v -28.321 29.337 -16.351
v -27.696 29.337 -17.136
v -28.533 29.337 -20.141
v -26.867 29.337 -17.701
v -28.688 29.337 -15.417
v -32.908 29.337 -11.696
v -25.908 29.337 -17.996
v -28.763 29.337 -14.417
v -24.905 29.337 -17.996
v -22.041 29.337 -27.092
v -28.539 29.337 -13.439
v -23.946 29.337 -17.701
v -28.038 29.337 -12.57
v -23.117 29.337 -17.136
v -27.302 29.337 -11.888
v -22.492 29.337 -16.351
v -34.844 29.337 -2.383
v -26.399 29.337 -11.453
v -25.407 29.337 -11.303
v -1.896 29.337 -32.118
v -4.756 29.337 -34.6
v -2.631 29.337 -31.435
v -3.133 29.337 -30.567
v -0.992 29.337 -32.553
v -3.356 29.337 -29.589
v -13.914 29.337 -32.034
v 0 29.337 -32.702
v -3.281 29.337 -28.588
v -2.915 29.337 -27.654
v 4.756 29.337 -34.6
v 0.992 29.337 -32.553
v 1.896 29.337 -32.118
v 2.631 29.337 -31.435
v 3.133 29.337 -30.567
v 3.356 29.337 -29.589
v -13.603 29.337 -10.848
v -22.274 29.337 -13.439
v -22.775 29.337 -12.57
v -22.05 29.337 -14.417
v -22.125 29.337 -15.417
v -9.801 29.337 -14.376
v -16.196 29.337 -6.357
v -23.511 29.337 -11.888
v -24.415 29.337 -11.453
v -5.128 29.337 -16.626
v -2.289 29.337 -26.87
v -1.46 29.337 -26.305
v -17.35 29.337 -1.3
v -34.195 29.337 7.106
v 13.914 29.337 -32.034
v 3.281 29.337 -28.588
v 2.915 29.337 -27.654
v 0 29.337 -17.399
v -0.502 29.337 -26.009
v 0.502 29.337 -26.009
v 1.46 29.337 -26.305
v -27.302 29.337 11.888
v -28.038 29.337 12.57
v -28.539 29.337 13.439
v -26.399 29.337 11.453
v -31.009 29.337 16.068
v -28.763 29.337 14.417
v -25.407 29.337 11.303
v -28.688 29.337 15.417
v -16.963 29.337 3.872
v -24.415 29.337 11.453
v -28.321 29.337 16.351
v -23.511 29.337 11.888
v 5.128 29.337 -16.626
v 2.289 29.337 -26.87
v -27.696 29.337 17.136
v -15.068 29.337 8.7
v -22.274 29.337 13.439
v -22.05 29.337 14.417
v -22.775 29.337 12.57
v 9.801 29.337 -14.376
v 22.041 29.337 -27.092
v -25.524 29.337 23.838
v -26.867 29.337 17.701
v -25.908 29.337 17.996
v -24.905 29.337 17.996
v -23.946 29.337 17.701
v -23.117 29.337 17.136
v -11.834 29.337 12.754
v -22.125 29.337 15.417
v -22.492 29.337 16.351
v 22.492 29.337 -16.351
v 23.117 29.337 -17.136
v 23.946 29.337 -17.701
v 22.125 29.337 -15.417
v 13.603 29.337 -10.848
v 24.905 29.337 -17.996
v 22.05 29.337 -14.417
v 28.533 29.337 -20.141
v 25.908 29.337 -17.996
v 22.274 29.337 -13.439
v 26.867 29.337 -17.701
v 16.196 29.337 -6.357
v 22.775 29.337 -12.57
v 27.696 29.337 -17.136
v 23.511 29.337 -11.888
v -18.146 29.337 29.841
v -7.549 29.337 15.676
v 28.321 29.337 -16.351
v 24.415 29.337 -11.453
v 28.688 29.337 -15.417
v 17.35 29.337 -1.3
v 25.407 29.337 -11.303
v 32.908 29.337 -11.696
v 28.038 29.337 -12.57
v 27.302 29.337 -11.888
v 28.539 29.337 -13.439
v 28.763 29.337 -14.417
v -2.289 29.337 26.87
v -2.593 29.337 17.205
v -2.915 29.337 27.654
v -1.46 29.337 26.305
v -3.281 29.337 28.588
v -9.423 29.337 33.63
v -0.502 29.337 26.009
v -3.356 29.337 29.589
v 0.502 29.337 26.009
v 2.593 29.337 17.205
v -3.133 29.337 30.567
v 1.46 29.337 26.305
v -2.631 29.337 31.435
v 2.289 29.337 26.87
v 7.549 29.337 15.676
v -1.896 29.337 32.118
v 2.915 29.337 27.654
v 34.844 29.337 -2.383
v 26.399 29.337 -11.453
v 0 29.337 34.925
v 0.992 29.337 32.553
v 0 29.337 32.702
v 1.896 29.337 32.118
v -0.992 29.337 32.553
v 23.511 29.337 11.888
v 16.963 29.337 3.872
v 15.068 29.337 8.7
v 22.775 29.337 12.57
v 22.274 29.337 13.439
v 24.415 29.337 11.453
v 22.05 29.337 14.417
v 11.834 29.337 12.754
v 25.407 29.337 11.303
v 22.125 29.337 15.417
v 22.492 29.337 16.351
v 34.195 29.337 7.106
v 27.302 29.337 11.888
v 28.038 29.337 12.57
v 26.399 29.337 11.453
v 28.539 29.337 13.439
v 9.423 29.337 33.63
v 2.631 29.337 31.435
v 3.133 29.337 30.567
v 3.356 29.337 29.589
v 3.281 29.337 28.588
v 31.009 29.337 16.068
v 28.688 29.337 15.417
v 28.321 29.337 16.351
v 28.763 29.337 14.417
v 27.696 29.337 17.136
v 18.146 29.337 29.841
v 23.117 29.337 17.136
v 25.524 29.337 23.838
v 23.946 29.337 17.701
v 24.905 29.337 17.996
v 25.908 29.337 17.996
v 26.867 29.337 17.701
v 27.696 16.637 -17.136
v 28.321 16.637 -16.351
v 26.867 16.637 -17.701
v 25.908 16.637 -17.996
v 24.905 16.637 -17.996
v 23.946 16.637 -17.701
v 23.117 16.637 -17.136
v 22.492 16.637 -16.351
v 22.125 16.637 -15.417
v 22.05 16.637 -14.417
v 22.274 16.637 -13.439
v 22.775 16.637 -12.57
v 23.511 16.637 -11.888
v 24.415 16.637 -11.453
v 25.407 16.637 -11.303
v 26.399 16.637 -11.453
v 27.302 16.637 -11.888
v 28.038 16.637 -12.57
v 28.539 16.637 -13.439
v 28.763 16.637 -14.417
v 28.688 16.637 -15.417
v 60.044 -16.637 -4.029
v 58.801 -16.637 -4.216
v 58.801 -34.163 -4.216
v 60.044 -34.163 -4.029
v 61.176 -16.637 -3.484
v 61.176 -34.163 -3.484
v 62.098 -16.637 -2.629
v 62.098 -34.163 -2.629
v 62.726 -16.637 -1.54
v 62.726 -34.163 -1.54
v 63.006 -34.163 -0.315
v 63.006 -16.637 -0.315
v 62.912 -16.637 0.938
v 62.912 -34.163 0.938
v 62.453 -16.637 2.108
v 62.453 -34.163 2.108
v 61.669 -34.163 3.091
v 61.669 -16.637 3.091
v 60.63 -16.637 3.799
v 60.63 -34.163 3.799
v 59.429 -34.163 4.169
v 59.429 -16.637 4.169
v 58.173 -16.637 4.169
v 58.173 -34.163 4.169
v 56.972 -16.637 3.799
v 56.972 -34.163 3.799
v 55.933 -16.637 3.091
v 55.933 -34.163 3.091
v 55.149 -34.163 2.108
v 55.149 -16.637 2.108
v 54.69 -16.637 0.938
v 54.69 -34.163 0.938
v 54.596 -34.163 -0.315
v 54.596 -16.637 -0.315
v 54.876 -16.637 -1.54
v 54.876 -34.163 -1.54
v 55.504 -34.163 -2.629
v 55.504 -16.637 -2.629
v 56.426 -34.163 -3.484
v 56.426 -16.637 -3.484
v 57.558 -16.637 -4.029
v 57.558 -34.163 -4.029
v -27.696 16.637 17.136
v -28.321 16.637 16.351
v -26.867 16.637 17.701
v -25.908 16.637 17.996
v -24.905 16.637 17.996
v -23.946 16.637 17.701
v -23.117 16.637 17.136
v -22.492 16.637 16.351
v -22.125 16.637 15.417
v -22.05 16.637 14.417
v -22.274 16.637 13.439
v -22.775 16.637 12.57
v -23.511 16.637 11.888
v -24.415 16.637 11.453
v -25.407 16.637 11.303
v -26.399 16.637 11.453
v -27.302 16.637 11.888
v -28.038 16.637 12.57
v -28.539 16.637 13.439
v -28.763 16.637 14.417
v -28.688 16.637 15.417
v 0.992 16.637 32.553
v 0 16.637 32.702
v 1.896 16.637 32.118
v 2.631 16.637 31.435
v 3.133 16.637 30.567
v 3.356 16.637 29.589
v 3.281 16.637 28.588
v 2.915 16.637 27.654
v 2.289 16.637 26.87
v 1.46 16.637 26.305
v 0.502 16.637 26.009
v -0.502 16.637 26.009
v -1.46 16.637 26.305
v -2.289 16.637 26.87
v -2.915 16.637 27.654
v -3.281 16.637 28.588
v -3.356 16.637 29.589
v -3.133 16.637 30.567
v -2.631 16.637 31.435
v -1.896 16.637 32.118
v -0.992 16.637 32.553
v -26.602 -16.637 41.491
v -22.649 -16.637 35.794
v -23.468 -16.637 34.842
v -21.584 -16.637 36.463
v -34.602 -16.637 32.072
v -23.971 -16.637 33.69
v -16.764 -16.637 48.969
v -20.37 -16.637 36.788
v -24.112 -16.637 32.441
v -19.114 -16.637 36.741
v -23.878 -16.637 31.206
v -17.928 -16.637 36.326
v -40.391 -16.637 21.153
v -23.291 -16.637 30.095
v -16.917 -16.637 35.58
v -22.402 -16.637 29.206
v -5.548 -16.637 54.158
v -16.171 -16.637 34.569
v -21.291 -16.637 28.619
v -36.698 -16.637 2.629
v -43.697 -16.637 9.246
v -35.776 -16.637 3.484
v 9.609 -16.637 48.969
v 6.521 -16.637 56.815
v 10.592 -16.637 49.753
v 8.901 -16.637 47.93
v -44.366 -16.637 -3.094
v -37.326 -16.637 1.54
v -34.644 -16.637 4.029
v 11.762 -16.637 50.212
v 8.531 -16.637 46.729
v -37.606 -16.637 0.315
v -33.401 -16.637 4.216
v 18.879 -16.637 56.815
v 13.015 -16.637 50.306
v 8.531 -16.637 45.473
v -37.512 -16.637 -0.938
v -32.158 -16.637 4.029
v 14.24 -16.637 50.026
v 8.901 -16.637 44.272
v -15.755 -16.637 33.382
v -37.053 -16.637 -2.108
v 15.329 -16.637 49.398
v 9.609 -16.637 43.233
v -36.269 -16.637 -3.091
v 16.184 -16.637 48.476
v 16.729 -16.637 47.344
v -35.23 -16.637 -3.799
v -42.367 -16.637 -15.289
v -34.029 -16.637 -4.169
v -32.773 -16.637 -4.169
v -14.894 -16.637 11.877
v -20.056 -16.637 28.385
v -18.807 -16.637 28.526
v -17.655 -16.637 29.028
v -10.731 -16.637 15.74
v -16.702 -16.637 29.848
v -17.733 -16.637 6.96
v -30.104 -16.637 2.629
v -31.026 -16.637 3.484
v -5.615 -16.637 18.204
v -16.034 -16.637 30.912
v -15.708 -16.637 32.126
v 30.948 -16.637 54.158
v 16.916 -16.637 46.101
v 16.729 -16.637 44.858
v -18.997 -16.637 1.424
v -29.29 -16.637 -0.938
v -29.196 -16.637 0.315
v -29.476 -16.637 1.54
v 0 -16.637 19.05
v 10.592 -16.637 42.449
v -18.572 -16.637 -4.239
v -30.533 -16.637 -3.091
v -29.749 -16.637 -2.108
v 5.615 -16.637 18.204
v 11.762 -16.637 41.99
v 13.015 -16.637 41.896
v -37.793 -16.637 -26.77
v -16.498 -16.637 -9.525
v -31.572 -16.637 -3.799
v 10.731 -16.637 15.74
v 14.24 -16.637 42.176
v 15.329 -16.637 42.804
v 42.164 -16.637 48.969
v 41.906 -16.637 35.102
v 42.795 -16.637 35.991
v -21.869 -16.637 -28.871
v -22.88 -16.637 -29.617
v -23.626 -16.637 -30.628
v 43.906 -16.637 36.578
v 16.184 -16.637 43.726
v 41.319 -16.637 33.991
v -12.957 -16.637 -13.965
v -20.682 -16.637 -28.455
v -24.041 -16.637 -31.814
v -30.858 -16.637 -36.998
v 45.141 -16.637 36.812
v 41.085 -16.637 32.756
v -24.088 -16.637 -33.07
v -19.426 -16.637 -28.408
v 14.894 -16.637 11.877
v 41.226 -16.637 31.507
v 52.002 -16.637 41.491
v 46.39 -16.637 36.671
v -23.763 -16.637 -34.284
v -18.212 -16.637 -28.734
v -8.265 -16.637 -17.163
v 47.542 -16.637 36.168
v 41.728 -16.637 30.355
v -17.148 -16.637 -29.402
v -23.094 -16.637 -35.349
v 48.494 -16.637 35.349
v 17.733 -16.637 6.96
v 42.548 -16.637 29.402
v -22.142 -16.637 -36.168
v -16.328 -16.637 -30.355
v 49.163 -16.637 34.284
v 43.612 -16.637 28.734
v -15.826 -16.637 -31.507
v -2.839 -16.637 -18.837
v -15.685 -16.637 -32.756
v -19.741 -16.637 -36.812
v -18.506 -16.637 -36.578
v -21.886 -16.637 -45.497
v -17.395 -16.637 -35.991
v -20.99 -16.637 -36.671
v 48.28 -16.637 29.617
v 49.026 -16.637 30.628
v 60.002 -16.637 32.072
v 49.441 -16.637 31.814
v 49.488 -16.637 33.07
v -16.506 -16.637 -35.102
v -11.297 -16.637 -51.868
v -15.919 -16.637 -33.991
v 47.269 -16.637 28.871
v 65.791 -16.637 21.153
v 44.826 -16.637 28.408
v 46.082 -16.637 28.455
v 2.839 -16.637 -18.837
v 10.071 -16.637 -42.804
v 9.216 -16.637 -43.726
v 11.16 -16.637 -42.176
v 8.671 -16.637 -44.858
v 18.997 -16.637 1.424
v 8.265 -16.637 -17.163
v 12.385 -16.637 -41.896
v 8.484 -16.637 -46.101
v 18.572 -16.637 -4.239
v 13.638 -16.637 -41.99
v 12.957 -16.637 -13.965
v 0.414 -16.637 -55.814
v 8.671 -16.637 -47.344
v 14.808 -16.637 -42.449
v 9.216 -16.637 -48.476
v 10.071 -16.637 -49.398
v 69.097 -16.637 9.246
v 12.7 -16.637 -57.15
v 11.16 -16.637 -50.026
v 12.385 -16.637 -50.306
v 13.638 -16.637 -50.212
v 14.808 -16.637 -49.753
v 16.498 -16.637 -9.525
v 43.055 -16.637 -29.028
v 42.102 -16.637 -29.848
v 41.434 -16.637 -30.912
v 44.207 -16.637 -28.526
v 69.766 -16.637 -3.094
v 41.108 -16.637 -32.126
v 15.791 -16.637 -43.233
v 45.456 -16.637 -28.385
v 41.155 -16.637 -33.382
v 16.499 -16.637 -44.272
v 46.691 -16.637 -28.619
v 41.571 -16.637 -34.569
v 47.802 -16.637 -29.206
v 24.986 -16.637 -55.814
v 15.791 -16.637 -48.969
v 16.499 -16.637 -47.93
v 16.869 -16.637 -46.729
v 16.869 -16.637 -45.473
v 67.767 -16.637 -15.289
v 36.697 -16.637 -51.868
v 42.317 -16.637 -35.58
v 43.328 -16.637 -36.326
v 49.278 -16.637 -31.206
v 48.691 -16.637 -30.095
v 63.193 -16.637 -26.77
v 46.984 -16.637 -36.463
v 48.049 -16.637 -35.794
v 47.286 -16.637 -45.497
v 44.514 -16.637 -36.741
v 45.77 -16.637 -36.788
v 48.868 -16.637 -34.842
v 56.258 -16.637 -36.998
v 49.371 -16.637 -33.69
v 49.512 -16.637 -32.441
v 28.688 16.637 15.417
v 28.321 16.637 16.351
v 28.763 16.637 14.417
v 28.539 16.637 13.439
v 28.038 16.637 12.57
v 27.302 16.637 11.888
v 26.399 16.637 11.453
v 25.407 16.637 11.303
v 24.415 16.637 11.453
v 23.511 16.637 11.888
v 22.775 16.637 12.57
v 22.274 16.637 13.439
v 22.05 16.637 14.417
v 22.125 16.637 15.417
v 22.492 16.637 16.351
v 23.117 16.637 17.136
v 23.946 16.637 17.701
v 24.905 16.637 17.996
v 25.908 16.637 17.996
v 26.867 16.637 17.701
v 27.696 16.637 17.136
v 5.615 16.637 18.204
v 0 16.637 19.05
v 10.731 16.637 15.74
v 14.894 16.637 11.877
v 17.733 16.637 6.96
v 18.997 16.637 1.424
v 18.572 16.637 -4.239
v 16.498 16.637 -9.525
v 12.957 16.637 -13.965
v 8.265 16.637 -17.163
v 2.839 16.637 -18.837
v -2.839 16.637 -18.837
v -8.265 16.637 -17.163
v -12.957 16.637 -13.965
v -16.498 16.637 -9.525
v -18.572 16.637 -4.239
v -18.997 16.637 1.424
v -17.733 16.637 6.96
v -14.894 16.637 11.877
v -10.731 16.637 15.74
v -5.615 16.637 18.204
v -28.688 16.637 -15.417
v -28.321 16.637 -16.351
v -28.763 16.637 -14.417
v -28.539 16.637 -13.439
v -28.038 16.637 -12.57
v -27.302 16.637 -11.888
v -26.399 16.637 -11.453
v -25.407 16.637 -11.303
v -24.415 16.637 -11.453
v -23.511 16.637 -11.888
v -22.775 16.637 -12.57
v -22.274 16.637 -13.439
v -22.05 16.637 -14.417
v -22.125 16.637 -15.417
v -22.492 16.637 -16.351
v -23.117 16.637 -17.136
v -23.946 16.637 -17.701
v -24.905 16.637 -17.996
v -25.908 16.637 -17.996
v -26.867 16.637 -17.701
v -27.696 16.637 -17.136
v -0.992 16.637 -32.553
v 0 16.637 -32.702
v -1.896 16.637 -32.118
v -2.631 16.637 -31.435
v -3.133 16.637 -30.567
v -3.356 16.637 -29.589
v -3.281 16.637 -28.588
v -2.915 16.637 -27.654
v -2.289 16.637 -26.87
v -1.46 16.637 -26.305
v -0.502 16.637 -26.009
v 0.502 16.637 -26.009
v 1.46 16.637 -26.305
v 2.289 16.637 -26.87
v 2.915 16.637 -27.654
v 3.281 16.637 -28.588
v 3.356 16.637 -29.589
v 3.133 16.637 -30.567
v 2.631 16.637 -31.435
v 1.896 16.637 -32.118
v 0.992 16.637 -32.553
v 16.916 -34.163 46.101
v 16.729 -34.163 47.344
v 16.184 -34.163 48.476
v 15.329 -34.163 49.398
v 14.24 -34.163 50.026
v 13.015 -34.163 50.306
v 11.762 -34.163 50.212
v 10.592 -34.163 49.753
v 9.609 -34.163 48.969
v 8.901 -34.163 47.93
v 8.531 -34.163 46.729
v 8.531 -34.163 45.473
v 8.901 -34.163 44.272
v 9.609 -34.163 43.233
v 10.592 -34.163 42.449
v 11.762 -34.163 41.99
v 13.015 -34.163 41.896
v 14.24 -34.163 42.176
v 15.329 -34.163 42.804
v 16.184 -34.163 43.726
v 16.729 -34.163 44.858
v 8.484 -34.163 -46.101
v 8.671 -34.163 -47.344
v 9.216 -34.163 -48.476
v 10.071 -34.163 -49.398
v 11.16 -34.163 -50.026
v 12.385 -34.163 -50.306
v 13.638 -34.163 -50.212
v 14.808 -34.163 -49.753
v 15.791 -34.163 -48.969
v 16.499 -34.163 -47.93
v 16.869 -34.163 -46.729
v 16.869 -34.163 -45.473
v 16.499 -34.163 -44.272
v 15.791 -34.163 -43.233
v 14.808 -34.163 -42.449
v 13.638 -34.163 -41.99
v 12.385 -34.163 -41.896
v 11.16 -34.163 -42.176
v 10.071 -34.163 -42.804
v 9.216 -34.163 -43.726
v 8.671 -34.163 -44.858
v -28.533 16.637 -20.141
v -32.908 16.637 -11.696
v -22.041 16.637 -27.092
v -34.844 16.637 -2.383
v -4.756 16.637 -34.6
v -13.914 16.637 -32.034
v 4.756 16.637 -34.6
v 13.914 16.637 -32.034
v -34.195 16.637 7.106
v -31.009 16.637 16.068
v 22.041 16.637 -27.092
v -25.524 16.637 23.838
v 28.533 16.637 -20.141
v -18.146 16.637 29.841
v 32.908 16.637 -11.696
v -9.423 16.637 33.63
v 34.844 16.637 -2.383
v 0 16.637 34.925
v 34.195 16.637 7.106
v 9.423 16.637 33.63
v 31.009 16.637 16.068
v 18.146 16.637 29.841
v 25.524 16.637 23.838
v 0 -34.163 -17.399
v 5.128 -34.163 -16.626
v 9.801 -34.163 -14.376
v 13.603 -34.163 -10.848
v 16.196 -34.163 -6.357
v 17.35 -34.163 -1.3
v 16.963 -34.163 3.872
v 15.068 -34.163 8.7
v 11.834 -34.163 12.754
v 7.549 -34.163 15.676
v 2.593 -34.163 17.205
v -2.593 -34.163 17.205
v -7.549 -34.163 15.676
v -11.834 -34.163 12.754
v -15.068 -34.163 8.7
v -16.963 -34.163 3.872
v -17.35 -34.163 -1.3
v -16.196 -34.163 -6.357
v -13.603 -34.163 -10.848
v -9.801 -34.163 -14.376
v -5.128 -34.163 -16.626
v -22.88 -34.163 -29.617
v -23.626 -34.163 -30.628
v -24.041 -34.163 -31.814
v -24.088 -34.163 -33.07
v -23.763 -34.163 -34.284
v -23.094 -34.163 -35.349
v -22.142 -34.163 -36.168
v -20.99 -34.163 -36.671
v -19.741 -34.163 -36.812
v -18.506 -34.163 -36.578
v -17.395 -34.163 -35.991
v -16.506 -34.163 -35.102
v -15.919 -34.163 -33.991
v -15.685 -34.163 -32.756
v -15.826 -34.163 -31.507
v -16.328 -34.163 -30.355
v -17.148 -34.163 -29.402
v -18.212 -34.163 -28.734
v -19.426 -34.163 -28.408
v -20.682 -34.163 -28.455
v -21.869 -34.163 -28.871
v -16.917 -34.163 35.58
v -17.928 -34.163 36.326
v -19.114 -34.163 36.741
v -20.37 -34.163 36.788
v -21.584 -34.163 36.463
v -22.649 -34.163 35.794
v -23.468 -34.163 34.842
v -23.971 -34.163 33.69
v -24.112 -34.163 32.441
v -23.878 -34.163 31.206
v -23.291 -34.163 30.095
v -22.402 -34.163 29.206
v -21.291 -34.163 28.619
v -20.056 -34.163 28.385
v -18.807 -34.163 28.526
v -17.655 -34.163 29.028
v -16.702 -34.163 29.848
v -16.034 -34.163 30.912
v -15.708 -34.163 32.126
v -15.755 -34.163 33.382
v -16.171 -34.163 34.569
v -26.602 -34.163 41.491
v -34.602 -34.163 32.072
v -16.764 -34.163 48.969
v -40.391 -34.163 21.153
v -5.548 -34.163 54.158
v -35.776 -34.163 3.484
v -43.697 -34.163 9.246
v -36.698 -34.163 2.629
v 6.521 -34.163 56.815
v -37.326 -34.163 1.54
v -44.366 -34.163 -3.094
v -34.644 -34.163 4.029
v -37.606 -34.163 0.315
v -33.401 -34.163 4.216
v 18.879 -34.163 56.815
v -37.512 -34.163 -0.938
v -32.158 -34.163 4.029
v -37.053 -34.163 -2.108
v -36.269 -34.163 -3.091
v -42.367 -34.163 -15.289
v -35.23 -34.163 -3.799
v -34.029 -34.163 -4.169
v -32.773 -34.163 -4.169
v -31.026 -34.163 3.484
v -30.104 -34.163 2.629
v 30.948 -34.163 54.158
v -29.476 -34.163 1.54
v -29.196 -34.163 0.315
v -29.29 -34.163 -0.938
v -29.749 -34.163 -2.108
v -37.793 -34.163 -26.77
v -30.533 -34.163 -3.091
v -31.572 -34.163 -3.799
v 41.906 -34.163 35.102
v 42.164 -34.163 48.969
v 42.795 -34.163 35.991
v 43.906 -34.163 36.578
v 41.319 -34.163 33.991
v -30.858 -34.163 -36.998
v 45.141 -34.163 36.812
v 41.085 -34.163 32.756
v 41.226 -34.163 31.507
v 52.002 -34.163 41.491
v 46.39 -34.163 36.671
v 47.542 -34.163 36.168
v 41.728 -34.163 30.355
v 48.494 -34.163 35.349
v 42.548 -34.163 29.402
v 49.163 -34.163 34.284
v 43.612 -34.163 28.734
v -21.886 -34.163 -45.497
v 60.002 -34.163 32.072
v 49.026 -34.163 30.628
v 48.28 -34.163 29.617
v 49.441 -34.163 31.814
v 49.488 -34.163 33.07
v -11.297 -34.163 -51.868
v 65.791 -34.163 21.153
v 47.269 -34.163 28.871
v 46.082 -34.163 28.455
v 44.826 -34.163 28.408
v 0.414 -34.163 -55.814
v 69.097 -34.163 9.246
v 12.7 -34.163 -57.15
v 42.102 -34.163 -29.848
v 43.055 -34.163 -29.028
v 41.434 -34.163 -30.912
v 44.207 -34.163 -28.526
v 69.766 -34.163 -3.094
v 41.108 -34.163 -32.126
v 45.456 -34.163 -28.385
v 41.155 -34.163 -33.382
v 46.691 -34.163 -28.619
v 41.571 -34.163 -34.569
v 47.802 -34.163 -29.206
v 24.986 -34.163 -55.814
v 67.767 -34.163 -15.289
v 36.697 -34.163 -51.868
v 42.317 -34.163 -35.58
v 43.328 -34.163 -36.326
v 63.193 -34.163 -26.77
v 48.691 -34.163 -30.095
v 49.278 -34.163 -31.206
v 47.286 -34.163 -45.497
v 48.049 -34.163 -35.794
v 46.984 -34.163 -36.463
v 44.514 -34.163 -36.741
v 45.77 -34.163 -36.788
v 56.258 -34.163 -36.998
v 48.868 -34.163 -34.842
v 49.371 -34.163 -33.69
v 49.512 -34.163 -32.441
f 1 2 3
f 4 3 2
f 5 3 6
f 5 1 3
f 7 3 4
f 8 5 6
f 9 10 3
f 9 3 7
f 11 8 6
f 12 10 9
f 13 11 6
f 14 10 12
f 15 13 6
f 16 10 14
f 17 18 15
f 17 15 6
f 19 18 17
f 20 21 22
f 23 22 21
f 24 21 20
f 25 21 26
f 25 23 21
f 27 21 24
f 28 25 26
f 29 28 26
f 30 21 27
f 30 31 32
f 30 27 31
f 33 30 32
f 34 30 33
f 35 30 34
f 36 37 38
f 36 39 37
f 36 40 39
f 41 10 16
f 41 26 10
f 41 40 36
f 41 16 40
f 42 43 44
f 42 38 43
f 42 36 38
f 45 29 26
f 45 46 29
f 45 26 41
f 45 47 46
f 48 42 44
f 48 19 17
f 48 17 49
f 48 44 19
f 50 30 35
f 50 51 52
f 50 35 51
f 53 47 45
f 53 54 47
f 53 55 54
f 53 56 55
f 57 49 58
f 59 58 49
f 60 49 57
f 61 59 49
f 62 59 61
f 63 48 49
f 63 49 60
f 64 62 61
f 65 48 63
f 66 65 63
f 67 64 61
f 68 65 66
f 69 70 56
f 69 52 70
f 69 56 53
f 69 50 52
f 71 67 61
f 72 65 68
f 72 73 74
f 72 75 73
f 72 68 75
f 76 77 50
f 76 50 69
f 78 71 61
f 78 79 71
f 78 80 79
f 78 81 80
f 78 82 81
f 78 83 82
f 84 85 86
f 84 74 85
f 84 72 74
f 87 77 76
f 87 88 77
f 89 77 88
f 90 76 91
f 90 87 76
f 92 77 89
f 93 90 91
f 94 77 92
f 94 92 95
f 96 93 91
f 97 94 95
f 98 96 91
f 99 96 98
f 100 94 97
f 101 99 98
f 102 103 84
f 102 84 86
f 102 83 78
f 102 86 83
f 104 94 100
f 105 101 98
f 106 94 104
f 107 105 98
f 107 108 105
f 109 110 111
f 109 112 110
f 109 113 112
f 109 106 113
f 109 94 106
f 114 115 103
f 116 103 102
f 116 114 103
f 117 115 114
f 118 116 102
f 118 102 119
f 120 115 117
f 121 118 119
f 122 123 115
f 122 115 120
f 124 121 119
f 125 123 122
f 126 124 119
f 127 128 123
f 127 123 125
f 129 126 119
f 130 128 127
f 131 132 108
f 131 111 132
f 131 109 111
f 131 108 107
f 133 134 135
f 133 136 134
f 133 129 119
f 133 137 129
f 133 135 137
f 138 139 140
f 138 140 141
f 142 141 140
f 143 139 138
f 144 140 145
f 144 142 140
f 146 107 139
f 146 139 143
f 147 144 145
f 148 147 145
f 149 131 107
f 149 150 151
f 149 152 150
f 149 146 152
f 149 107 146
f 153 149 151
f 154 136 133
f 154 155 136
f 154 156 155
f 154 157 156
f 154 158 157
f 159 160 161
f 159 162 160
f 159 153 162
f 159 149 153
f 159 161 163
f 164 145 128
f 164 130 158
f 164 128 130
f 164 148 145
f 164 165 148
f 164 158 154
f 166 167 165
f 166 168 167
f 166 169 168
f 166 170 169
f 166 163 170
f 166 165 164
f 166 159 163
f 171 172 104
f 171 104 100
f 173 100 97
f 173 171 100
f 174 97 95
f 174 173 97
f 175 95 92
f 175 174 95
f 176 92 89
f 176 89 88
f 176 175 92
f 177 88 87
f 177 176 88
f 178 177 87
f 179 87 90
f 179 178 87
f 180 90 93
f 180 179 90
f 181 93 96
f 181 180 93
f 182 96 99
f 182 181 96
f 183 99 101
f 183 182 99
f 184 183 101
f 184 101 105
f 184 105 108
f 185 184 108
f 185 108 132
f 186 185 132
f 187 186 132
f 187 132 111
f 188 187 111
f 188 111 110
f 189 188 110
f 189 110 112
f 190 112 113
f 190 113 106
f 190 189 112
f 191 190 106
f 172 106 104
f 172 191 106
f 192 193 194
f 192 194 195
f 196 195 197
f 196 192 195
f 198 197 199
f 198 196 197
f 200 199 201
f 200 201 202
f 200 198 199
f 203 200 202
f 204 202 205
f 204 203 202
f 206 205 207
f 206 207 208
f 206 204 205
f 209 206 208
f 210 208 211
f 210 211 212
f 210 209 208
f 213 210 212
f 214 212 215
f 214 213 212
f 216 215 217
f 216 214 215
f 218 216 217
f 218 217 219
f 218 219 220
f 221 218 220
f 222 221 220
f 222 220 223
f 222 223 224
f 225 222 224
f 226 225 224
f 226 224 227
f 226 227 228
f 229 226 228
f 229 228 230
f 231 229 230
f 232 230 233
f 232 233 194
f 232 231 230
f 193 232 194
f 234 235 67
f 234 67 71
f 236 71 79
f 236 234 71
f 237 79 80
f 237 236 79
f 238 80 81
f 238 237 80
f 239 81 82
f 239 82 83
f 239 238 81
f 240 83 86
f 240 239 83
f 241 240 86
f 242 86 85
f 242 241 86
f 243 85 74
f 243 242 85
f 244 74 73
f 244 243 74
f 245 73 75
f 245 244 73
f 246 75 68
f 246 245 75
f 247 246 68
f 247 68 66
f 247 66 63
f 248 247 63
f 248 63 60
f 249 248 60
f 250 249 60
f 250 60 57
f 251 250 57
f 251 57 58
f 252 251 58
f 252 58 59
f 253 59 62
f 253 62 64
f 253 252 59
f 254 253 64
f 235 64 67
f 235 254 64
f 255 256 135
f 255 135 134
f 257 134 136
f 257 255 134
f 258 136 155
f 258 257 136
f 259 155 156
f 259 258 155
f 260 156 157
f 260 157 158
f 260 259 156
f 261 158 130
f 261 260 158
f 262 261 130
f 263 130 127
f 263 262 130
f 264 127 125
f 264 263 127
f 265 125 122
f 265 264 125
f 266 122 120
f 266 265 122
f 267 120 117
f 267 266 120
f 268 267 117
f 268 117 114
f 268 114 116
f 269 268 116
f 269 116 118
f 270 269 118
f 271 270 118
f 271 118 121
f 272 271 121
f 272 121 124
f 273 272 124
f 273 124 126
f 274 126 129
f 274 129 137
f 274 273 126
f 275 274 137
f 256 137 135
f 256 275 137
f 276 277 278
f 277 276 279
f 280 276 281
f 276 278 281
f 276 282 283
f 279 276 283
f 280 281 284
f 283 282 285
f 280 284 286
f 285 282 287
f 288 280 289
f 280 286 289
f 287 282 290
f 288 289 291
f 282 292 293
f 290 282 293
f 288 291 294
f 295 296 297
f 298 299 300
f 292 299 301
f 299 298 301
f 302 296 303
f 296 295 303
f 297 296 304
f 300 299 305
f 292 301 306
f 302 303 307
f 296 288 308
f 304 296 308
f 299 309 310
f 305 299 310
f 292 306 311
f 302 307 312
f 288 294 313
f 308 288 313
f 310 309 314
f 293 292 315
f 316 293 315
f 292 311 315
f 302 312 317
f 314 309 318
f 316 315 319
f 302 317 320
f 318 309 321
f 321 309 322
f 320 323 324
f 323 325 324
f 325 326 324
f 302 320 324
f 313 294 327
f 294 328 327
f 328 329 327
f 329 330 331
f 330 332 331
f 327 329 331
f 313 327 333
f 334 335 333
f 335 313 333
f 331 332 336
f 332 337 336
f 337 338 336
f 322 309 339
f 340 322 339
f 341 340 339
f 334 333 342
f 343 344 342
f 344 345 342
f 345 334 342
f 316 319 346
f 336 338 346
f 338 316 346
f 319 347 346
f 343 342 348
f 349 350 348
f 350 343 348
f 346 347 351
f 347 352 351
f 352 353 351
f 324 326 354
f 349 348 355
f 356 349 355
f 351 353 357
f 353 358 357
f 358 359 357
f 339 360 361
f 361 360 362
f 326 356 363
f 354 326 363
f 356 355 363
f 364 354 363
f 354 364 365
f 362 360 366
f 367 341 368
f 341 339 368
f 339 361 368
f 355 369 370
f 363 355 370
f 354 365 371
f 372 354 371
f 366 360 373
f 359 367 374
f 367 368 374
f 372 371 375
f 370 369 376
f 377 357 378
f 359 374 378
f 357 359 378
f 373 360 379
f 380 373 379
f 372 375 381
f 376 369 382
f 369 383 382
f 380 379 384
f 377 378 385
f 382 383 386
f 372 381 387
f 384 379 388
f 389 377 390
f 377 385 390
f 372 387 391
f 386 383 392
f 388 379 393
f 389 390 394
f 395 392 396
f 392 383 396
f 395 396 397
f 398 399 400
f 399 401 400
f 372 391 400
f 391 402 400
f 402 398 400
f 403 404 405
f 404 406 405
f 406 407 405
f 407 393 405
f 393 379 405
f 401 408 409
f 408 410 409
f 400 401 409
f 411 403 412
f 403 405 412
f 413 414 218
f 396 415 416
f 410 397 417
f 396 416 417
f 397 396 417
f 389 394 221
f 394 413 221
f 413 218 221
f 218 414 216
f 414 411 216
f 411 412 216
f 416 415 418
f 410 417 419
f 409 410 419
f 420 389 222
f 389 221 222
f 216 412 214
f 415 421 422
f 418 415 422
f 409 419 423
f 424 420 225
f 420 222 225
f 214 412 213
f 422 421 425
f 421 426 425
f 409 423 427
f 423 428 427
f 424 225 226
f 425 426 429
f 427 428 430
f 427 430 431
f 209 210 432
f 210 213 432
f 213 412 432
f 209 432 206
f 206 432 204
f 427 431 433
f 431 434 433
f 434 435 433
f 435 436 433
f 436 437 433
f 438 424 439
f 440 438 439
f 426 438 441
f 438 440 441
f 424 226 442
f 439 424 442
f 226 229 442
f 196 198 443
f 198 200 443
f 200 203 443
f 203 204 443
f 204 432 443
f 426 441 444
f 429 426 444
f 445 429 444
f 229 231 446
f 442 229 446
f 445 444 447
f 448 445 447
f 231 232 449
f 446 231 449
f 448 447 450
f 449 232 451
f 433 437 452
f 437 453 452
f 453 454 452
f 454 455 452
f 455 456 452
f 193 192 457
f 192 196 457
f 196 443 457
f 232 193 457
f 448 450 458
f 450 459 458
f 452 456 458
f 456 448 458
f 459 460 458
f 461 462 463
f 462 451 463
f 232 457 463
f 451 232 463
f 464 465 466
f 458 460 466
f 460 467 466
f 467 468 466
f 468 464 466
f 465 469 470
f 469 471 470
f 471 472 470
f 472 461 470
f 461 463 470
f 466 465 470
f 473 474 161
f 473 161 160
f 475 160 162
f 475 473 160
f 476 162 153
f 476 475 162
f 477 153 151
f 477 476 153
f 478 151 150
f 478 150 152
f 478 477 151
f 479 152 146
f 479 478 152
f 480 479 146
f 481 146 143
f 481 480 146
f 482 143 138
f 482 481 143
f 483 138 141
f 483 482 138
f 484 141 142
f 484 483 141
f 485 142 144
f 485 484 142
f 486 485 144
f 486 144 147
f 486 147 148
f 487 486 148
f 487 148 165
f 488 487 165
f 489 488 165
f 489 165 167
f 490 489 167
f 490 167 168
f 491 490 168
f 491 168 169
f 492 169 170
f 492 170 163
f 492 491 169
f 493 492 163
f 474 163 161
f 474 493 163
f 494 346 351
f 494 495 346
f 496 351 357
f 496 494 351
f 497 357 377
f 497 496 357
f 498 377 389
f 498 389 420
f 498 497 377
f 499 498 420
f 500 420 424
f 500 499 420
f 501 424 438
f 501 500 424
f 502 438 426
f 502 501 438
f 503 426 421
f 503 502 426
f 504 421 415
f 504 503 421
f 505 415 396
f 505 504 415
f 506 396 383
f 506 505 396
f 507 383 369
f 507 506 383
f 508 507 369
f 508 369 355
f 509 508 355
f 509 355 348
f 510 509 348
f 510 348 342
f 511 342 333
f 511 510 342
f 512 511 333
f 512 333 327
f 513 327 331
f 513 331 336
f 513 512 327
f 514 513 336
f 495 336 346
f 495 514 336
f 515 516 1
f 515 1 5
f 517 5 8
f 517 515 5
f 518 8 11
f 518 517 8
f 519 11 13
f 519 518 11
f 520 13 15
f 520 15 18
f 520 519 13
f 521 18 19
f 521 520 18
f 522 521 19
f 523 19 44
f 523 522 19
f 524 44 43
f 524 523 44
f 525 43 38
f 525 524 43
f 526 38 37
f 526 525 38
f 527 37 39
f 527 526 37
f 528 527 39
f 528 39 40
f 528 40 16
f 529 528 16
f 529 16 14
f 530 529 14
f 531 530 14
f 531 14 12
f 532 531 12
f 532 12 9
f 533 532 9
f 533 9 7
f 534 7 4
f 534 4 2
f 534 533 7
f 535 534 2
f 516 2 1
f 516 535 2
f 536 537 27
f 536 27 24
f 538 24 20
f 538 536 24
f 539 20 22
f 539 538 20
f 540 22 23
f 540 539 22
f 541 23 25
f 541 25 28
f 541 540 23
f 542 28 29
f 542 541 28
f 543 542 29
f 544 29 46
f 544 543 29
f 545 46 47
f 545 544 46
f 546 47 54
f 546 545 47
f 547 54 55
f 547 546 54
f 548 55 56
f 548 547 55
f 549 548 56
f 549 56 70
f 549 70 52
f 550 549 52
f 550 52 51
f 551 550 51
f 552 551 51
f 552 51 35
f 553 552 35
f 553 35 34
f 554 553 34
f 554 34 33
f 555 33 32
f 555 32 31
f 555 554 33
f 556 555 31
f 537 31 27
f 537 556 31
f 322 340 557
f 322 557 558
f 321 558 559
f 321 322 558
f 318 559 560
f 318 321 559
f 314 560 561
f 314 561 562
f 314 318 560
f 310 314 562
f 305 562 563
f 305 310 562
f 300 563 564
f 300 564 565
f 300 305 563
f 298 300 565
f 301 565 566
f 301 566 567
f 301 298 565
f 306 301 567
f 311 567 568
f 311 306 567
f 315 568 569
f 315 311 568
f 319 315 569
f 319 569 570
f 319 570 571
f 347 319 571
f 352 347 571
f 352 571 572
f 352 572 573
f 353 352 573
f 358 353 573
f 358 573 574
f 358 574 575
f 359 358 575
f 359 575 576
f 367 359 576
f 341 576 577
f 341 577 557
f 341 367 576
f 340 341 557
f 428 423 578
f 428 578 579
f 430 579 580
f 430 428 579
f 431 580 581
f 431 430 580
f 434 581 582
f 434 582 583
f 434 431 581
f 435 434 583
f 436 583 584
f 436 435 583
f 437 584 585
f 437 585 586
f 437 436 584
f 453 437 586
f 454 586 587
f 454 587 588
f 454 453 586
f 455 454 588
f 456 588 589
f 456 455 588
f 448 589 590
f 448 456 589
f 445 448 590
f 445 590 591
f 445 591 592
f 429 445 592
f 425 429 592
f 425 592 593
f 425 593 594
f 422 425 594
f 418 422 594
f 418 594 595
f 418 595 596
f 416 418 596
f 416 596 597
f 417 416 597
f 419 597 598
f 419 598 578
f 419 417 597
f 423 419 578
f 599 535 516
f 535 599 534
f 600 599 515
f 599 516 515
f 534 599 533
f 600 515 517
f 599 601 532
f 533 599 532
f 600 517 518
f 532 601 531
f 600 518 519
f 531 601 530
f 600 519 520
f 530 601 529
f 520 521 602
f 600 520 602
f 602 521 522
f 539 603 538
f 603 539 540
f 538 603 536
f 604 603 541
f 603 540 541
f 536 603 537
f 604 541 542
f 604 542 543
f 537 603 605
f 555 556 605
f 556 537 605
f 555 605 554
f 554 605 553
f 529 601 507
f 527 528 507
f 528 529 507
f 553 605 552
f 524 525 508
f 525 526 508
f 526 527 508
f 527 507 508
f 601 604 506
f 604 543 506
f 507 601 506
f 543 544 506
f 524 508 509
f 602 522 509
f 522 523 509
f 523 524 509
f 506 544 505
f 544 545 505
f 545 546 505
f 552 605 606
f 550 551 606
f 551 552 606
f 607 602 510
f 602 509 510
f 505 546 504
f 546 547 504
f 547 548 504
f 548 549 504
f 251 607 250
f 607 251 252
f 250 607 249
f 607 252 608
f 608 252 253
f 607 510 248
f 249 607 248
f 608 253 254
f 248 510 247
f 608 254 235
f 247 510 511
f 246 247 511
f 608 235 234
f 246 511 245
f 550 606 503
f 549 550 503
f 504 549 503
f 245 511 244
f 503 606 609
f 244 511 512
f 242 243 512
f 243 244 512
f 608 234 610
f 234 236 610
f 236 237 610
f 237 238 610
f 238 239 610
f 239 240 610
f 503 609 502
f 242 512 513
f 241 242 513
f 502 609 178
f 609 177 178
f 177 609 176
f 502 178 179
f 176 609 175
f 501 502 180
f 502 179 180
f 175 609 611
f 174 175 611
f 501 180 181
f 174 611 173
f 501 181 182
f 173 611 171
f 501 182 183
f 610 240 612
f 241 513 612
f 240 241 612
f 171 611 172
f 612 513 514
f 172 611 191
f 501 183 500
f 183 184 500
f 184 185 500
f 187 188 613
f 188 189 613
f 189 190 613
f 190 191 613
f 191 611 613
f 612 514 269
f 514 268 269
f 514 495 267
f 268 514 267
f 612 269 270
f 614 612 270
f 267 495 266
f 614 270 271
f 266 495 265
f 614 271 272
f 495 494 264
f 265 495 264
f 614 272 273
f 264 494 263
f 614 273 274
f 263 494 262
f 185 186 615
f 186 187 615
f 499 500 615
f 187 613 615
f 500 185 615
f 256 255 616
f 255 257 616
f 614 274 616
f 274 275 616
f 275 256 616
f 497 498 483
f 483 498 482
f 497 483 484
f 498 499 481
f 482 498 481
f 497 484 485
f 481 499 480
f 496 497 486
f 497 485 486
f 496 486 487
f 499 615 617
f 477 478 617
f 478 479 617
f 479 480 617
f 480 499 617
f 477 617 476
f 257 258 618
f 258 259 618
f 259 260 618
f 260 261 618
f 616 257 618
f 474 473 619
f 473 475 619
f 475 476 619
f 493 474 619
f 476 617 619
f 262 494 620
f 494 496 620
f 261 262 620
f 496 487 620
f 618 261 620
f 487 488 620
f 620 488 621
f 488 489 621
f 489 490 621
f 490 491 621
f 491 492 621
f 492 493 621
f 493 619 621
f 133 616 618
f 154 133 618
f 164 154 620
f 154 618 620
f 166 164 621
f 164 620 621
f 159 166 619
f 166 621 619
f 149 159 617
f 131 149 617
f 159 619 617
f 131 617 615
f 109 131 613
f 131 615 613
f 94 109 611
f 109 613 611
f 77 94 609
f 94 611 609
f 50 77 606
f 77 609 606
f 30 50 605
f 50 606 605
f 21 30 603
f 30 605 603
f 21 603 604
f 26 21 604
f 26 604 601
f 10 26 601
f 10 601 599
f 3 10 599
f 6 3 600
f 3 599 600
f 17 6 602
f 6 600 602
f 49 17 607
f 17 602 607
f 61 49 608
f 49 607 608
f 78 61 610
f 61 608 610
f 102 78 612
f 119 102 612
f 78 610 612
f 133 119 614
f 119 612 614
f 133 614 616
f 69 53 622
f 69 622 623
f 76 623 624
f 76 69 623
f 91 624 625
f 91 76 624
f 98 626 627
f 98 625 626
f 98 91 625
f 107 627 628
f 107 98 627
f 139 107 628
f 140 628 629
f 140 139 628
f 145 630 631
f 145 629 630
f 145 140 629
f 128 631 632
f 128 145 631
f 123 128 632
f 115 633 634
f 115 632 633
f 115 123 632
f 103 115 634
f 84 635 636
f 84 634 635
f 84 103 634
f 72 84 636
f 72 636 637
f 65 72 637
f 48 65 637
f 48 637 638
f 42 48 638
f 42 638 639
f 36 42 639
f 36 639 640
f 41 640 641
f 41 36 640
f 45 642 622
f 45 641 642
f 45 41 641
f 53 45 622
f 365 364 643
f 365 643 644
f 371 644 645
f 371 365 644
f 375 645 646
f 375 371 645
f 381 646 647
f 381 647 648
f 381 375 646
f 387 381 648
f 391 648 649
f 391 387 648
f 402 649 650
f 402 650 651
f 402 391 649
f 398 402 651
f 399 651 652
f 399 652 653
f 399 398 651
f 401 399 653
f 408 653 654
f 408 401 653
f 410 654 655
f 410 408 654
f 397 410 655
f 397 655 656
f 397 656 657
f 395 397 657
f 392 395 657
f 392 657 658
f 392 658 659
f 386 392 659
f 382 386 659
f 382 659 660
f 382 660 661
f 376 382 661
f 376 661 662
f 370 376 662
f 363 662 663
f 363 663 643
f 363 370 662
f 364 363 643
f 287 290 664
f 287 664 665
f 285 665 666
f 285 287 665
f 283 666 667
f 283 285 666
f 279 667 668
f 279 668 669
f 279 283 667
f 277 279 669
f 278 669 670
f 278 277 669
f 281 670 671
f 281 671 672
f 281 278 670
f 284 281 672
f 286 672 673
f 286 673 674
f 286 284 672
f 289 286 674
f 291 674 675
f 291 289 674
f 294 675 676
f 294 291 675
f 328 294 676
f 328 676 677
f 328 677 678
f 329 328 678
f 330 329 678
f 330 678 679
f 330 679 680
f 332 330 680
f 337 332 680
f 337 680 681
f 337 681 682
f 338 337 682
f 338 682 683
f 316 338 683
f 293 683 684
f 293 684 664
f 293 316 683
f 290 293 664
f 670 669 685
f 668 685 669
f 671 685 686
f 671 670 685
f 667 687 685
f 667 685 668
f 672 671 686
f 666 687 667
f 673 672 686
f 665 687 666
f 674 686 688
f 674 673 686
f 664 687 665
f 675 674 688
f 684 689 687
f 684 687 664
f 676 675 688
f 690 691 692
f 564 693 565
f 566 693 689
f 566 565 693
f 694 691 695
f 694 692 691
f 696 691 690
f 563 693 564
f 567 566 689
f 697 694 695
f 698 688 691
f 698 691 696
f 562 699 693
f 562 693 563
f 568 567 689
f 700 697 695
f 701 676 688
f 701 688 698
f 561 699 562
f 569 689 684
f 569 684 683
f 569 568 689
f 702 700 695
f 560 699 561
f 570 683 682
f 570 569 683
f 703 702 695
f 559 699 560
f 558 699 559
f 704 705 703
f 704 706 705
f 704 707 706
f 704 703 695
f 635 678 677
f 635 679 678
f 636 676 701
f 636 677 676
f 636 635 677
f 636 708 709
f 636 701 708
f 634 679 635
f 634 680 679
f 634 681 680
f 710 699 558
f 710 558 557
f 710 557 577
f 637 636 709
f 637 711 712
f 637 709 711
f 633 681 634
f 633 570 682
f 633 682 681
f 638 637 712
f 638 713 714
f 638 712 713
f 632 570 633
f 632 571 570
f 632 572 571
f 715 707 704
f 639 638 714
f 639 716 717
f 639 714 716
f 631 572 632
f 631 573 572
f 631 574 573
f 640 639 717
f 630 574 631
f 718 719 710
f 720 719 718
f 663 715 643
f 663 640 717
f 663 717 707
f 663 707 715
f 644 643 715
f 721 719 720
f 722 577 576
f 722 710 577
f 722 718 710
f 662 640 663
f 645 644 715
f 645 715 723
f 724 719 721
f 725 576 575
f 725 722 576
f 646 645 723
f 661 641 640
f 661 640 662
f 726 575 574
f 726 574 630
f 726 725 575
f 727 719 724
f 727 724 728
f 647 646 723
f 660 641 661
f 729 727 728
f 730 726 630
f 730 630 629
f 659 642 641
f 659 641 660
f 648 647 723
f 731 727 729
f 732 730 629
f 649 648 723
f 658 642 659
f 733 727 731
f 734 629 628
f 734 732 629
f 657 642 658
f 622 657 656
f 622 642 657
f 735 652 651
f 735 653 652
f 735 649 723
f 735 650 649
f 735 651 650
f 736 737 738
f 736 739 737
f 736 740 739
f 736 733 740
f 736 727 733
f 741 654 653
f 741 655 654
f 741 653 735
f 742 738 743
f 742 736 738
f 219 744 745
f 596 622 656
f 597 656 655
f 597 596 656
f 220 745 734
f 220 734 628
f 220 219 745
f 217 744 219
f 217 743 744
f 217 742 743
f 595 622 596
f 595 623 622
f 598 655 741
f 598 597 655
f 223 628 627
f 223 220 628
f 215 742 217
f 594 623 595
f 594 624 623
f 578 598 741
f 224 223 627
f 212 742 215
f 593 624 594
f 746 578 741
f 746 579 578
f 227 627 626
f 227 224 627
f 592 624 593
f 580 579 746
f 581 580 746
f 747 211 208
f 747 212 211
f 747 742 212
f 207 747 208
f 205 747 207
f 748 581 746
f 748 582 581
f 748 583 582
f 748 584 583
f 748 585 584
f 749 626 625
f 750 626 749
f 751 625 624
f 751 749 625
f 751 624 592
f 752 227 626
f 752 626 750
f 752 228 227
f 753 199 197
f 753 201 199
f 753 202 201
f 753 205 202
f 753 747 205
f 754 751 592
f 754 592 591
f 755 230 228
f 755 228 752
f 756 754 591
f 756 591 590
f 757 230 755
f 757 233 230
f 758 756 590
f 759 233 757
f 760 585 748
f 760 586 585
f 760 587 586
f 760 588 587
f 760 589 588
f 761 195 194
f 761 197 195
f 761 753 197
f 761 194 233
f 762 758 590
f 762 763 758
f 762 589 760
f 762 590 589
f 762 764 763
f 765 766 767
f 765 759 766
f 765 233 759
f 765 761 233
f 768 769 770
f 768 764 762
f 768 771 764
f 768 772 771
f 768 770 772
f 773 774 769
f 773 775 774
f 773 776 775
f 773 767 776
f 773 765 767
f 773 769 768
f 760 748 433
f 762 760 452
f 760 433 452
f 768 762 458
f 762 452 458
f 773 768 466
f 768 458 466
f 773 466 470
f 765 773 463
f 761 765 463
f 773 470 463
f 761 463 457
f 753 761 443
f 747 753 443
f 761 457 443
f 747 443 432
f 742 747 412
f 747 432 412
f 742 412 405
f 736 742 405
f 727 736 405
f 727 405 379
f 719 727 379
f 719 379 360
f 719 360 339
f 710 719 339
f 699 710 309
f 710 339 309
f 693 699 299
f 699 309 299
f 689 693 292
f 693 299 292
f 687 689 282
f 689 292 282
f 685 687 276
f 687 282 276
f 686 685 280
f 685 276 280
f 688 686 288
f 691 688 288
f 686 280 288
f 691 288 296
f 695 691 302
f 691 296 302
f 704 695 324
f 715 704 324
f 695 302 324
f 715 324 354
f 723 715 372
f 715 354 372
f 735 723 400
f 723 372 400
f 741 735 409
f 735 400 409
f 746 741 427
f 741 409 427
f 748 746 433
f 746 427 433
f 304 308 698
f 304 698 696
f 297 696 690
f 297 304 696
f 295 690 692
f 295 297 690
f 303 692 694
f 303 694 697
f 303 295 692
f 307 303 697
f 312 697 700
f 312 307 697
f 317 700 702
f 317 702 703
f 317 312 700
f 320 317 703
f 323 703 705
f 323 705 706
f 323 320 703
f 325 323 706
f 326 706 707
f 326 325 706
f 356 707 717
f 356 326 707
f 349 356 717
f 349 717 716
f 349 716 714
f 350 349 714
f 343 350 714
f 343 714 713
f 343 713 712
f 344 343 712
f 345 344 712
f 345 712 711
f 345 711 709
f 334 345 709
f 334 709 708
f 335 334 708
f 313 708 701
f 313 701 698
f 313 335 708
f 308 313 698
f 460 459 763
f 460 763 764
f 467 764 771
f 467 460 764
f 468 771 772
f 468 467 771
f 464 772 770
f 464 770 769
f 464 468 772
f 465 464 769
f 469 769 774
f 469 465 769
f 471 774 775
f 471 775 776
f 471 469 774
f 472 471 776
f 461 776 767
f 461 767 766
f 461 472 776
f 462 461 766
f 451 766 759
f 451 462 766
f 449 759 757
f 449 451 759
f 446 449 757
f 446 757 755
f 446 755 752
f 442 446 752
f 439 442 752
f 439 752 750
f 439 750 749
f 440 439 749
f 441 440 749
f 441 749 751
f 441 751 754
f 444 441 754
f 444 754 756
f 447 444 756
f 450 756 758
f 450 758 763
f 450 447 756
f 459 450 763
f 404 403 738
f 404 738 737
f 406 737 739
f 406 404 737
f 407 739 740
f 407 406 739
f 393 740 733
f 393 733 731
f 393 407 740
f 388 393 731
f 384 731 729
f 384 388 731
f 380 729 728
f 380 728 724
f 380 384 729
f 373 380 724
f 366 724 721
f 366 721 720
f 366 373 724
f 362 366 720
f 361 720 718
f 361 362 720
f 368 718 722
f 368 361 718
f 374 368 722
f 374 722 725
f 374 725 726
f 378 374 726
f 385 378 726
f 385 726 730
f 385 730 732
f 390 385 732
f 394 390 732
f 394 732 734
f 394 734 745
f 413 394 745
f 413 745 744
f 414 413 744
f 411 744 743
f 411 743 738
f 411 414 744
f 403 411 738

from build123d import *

# Parameters (mm, degrees)
SKETCH1_R               = 19.05
EXTRUDE1_DEPTH          = 16.637
SKETCH4_R               = 34.925
EXTRUDE2_DEPTH          = 12.7
SKETCH6_R               = 57.15
EXTRUDE3_DEPTH          = 17.526
CUT_EXTRUDE1_DEPTH      = 102.285505755
CUT_EXTRUDE1_DEPTH_BACK = 102.285505755
SKETCH7_R               = 17.399
SKETCH8_R               = 3.3655
CUT_EXTRUDE2_DEPTH      = 12.7
CIRPATTERN1_COUNT       = 6
SKETCH9_R               = 4.2164
CUT_EXTRUDE3_DEPTH      = 17.526
CIRPATTERN2_COUNT       = 8


with BuildPart() as part:
    # Sketch1 → Extrude1 (new, symmetric)
    with BuildSketch(Plane(origin=(0, 0, 0), x_dir=(1, 0, 0), z_dir=(0, 1, 0))):
        Circle(SKETCH1_R)
    extrude(amount=EXTRUDE1_DEPTH, both=True)

    # Sketch4 → Extrude2 (add)
    with BuildSketch(Plane(origin=(0, 16.637, 0), x_dir=(-1, 0, 0), z_dir=(0, 1, 0))):
        Circle(SKETCH4_R)
    extrude(amount=EXTRUDE2_DEPTH)

    # Sketch6 → Extrude3 (add)
    with BuildSketch(Plane.XZ.offset(16.637)):
        with Locations((12.7, 0)):
            Circle(SKETCH6_R)
    extrude(amount=EXTRUDE3_DEPTH)

    # Sketch7 → Cut-Extrude1 (cut, two sides: drawn at the far end of the back side and taken through both)
    with BuildSketch(Plane.XZ.offset(16.637).offset(-CUT_EXTRUDE1_DEPTH_BACK)):
        Circle(SKETCH7_R)
    extrude(amount=CUT_EXTRUDE1_DEPTH + CUT_EXTRUDE1_DEPTH_BACK, mode=Mode.SUBTRACT)

    # Sketch8 → Cut-Extrude2 (cut)
    with BuildSketch(Plane(origin=(0, 16.637, 0), x_dir=(-1, 0, 0), z_dir=(0, 1, 0))):
        with Locations((0, 29.337)):
            Circle(SKETCH8_R)
    cut_extrude2 = extrude(amount=CUT_EXTRUDE2_DEPTH, mode=Mode.SUBTRACT)

    # CirPattern1: Cut-Extrude2 ×6 about axis
    cirpattern1_axis = Axis((0, 69.04565356, 0), (0, -1, 0))
    for i in range(1, CIRPATTERN1_COUNT):
        add(cut_extrude2.rotate(cirpattern1_axis, i * 360 / CIRPATTERN1_COUNT), mode=Mode.SUBTRACT)

    # Sketch9 → Cut-Extrude3 (cut)
    with BuildSketch(Plane.XZ.offset(16.637)):
        with Locations((12.7, 46.101)):
            Circle(SKETCH9_R)
    cut_extrude3 = extrude(amount=CUT_EXTRUDE3_DEPTH, mode=Mode.SUBTRACT)

    # CirPattern2: Cut-Extrude3 ×8 about axis
    cirpattern2_axis = Axis((12.7, -85.68265356, 0), (0, 1, 0))
    for i in range(1, CIRPATTERN2_COUNT):
        add(cut_extrude3.rotate(cirpattern2_axis, i * 360 / CIRPATTERN2_COUNT), mode=Mode.SUBTRACT)


solid = part.part
